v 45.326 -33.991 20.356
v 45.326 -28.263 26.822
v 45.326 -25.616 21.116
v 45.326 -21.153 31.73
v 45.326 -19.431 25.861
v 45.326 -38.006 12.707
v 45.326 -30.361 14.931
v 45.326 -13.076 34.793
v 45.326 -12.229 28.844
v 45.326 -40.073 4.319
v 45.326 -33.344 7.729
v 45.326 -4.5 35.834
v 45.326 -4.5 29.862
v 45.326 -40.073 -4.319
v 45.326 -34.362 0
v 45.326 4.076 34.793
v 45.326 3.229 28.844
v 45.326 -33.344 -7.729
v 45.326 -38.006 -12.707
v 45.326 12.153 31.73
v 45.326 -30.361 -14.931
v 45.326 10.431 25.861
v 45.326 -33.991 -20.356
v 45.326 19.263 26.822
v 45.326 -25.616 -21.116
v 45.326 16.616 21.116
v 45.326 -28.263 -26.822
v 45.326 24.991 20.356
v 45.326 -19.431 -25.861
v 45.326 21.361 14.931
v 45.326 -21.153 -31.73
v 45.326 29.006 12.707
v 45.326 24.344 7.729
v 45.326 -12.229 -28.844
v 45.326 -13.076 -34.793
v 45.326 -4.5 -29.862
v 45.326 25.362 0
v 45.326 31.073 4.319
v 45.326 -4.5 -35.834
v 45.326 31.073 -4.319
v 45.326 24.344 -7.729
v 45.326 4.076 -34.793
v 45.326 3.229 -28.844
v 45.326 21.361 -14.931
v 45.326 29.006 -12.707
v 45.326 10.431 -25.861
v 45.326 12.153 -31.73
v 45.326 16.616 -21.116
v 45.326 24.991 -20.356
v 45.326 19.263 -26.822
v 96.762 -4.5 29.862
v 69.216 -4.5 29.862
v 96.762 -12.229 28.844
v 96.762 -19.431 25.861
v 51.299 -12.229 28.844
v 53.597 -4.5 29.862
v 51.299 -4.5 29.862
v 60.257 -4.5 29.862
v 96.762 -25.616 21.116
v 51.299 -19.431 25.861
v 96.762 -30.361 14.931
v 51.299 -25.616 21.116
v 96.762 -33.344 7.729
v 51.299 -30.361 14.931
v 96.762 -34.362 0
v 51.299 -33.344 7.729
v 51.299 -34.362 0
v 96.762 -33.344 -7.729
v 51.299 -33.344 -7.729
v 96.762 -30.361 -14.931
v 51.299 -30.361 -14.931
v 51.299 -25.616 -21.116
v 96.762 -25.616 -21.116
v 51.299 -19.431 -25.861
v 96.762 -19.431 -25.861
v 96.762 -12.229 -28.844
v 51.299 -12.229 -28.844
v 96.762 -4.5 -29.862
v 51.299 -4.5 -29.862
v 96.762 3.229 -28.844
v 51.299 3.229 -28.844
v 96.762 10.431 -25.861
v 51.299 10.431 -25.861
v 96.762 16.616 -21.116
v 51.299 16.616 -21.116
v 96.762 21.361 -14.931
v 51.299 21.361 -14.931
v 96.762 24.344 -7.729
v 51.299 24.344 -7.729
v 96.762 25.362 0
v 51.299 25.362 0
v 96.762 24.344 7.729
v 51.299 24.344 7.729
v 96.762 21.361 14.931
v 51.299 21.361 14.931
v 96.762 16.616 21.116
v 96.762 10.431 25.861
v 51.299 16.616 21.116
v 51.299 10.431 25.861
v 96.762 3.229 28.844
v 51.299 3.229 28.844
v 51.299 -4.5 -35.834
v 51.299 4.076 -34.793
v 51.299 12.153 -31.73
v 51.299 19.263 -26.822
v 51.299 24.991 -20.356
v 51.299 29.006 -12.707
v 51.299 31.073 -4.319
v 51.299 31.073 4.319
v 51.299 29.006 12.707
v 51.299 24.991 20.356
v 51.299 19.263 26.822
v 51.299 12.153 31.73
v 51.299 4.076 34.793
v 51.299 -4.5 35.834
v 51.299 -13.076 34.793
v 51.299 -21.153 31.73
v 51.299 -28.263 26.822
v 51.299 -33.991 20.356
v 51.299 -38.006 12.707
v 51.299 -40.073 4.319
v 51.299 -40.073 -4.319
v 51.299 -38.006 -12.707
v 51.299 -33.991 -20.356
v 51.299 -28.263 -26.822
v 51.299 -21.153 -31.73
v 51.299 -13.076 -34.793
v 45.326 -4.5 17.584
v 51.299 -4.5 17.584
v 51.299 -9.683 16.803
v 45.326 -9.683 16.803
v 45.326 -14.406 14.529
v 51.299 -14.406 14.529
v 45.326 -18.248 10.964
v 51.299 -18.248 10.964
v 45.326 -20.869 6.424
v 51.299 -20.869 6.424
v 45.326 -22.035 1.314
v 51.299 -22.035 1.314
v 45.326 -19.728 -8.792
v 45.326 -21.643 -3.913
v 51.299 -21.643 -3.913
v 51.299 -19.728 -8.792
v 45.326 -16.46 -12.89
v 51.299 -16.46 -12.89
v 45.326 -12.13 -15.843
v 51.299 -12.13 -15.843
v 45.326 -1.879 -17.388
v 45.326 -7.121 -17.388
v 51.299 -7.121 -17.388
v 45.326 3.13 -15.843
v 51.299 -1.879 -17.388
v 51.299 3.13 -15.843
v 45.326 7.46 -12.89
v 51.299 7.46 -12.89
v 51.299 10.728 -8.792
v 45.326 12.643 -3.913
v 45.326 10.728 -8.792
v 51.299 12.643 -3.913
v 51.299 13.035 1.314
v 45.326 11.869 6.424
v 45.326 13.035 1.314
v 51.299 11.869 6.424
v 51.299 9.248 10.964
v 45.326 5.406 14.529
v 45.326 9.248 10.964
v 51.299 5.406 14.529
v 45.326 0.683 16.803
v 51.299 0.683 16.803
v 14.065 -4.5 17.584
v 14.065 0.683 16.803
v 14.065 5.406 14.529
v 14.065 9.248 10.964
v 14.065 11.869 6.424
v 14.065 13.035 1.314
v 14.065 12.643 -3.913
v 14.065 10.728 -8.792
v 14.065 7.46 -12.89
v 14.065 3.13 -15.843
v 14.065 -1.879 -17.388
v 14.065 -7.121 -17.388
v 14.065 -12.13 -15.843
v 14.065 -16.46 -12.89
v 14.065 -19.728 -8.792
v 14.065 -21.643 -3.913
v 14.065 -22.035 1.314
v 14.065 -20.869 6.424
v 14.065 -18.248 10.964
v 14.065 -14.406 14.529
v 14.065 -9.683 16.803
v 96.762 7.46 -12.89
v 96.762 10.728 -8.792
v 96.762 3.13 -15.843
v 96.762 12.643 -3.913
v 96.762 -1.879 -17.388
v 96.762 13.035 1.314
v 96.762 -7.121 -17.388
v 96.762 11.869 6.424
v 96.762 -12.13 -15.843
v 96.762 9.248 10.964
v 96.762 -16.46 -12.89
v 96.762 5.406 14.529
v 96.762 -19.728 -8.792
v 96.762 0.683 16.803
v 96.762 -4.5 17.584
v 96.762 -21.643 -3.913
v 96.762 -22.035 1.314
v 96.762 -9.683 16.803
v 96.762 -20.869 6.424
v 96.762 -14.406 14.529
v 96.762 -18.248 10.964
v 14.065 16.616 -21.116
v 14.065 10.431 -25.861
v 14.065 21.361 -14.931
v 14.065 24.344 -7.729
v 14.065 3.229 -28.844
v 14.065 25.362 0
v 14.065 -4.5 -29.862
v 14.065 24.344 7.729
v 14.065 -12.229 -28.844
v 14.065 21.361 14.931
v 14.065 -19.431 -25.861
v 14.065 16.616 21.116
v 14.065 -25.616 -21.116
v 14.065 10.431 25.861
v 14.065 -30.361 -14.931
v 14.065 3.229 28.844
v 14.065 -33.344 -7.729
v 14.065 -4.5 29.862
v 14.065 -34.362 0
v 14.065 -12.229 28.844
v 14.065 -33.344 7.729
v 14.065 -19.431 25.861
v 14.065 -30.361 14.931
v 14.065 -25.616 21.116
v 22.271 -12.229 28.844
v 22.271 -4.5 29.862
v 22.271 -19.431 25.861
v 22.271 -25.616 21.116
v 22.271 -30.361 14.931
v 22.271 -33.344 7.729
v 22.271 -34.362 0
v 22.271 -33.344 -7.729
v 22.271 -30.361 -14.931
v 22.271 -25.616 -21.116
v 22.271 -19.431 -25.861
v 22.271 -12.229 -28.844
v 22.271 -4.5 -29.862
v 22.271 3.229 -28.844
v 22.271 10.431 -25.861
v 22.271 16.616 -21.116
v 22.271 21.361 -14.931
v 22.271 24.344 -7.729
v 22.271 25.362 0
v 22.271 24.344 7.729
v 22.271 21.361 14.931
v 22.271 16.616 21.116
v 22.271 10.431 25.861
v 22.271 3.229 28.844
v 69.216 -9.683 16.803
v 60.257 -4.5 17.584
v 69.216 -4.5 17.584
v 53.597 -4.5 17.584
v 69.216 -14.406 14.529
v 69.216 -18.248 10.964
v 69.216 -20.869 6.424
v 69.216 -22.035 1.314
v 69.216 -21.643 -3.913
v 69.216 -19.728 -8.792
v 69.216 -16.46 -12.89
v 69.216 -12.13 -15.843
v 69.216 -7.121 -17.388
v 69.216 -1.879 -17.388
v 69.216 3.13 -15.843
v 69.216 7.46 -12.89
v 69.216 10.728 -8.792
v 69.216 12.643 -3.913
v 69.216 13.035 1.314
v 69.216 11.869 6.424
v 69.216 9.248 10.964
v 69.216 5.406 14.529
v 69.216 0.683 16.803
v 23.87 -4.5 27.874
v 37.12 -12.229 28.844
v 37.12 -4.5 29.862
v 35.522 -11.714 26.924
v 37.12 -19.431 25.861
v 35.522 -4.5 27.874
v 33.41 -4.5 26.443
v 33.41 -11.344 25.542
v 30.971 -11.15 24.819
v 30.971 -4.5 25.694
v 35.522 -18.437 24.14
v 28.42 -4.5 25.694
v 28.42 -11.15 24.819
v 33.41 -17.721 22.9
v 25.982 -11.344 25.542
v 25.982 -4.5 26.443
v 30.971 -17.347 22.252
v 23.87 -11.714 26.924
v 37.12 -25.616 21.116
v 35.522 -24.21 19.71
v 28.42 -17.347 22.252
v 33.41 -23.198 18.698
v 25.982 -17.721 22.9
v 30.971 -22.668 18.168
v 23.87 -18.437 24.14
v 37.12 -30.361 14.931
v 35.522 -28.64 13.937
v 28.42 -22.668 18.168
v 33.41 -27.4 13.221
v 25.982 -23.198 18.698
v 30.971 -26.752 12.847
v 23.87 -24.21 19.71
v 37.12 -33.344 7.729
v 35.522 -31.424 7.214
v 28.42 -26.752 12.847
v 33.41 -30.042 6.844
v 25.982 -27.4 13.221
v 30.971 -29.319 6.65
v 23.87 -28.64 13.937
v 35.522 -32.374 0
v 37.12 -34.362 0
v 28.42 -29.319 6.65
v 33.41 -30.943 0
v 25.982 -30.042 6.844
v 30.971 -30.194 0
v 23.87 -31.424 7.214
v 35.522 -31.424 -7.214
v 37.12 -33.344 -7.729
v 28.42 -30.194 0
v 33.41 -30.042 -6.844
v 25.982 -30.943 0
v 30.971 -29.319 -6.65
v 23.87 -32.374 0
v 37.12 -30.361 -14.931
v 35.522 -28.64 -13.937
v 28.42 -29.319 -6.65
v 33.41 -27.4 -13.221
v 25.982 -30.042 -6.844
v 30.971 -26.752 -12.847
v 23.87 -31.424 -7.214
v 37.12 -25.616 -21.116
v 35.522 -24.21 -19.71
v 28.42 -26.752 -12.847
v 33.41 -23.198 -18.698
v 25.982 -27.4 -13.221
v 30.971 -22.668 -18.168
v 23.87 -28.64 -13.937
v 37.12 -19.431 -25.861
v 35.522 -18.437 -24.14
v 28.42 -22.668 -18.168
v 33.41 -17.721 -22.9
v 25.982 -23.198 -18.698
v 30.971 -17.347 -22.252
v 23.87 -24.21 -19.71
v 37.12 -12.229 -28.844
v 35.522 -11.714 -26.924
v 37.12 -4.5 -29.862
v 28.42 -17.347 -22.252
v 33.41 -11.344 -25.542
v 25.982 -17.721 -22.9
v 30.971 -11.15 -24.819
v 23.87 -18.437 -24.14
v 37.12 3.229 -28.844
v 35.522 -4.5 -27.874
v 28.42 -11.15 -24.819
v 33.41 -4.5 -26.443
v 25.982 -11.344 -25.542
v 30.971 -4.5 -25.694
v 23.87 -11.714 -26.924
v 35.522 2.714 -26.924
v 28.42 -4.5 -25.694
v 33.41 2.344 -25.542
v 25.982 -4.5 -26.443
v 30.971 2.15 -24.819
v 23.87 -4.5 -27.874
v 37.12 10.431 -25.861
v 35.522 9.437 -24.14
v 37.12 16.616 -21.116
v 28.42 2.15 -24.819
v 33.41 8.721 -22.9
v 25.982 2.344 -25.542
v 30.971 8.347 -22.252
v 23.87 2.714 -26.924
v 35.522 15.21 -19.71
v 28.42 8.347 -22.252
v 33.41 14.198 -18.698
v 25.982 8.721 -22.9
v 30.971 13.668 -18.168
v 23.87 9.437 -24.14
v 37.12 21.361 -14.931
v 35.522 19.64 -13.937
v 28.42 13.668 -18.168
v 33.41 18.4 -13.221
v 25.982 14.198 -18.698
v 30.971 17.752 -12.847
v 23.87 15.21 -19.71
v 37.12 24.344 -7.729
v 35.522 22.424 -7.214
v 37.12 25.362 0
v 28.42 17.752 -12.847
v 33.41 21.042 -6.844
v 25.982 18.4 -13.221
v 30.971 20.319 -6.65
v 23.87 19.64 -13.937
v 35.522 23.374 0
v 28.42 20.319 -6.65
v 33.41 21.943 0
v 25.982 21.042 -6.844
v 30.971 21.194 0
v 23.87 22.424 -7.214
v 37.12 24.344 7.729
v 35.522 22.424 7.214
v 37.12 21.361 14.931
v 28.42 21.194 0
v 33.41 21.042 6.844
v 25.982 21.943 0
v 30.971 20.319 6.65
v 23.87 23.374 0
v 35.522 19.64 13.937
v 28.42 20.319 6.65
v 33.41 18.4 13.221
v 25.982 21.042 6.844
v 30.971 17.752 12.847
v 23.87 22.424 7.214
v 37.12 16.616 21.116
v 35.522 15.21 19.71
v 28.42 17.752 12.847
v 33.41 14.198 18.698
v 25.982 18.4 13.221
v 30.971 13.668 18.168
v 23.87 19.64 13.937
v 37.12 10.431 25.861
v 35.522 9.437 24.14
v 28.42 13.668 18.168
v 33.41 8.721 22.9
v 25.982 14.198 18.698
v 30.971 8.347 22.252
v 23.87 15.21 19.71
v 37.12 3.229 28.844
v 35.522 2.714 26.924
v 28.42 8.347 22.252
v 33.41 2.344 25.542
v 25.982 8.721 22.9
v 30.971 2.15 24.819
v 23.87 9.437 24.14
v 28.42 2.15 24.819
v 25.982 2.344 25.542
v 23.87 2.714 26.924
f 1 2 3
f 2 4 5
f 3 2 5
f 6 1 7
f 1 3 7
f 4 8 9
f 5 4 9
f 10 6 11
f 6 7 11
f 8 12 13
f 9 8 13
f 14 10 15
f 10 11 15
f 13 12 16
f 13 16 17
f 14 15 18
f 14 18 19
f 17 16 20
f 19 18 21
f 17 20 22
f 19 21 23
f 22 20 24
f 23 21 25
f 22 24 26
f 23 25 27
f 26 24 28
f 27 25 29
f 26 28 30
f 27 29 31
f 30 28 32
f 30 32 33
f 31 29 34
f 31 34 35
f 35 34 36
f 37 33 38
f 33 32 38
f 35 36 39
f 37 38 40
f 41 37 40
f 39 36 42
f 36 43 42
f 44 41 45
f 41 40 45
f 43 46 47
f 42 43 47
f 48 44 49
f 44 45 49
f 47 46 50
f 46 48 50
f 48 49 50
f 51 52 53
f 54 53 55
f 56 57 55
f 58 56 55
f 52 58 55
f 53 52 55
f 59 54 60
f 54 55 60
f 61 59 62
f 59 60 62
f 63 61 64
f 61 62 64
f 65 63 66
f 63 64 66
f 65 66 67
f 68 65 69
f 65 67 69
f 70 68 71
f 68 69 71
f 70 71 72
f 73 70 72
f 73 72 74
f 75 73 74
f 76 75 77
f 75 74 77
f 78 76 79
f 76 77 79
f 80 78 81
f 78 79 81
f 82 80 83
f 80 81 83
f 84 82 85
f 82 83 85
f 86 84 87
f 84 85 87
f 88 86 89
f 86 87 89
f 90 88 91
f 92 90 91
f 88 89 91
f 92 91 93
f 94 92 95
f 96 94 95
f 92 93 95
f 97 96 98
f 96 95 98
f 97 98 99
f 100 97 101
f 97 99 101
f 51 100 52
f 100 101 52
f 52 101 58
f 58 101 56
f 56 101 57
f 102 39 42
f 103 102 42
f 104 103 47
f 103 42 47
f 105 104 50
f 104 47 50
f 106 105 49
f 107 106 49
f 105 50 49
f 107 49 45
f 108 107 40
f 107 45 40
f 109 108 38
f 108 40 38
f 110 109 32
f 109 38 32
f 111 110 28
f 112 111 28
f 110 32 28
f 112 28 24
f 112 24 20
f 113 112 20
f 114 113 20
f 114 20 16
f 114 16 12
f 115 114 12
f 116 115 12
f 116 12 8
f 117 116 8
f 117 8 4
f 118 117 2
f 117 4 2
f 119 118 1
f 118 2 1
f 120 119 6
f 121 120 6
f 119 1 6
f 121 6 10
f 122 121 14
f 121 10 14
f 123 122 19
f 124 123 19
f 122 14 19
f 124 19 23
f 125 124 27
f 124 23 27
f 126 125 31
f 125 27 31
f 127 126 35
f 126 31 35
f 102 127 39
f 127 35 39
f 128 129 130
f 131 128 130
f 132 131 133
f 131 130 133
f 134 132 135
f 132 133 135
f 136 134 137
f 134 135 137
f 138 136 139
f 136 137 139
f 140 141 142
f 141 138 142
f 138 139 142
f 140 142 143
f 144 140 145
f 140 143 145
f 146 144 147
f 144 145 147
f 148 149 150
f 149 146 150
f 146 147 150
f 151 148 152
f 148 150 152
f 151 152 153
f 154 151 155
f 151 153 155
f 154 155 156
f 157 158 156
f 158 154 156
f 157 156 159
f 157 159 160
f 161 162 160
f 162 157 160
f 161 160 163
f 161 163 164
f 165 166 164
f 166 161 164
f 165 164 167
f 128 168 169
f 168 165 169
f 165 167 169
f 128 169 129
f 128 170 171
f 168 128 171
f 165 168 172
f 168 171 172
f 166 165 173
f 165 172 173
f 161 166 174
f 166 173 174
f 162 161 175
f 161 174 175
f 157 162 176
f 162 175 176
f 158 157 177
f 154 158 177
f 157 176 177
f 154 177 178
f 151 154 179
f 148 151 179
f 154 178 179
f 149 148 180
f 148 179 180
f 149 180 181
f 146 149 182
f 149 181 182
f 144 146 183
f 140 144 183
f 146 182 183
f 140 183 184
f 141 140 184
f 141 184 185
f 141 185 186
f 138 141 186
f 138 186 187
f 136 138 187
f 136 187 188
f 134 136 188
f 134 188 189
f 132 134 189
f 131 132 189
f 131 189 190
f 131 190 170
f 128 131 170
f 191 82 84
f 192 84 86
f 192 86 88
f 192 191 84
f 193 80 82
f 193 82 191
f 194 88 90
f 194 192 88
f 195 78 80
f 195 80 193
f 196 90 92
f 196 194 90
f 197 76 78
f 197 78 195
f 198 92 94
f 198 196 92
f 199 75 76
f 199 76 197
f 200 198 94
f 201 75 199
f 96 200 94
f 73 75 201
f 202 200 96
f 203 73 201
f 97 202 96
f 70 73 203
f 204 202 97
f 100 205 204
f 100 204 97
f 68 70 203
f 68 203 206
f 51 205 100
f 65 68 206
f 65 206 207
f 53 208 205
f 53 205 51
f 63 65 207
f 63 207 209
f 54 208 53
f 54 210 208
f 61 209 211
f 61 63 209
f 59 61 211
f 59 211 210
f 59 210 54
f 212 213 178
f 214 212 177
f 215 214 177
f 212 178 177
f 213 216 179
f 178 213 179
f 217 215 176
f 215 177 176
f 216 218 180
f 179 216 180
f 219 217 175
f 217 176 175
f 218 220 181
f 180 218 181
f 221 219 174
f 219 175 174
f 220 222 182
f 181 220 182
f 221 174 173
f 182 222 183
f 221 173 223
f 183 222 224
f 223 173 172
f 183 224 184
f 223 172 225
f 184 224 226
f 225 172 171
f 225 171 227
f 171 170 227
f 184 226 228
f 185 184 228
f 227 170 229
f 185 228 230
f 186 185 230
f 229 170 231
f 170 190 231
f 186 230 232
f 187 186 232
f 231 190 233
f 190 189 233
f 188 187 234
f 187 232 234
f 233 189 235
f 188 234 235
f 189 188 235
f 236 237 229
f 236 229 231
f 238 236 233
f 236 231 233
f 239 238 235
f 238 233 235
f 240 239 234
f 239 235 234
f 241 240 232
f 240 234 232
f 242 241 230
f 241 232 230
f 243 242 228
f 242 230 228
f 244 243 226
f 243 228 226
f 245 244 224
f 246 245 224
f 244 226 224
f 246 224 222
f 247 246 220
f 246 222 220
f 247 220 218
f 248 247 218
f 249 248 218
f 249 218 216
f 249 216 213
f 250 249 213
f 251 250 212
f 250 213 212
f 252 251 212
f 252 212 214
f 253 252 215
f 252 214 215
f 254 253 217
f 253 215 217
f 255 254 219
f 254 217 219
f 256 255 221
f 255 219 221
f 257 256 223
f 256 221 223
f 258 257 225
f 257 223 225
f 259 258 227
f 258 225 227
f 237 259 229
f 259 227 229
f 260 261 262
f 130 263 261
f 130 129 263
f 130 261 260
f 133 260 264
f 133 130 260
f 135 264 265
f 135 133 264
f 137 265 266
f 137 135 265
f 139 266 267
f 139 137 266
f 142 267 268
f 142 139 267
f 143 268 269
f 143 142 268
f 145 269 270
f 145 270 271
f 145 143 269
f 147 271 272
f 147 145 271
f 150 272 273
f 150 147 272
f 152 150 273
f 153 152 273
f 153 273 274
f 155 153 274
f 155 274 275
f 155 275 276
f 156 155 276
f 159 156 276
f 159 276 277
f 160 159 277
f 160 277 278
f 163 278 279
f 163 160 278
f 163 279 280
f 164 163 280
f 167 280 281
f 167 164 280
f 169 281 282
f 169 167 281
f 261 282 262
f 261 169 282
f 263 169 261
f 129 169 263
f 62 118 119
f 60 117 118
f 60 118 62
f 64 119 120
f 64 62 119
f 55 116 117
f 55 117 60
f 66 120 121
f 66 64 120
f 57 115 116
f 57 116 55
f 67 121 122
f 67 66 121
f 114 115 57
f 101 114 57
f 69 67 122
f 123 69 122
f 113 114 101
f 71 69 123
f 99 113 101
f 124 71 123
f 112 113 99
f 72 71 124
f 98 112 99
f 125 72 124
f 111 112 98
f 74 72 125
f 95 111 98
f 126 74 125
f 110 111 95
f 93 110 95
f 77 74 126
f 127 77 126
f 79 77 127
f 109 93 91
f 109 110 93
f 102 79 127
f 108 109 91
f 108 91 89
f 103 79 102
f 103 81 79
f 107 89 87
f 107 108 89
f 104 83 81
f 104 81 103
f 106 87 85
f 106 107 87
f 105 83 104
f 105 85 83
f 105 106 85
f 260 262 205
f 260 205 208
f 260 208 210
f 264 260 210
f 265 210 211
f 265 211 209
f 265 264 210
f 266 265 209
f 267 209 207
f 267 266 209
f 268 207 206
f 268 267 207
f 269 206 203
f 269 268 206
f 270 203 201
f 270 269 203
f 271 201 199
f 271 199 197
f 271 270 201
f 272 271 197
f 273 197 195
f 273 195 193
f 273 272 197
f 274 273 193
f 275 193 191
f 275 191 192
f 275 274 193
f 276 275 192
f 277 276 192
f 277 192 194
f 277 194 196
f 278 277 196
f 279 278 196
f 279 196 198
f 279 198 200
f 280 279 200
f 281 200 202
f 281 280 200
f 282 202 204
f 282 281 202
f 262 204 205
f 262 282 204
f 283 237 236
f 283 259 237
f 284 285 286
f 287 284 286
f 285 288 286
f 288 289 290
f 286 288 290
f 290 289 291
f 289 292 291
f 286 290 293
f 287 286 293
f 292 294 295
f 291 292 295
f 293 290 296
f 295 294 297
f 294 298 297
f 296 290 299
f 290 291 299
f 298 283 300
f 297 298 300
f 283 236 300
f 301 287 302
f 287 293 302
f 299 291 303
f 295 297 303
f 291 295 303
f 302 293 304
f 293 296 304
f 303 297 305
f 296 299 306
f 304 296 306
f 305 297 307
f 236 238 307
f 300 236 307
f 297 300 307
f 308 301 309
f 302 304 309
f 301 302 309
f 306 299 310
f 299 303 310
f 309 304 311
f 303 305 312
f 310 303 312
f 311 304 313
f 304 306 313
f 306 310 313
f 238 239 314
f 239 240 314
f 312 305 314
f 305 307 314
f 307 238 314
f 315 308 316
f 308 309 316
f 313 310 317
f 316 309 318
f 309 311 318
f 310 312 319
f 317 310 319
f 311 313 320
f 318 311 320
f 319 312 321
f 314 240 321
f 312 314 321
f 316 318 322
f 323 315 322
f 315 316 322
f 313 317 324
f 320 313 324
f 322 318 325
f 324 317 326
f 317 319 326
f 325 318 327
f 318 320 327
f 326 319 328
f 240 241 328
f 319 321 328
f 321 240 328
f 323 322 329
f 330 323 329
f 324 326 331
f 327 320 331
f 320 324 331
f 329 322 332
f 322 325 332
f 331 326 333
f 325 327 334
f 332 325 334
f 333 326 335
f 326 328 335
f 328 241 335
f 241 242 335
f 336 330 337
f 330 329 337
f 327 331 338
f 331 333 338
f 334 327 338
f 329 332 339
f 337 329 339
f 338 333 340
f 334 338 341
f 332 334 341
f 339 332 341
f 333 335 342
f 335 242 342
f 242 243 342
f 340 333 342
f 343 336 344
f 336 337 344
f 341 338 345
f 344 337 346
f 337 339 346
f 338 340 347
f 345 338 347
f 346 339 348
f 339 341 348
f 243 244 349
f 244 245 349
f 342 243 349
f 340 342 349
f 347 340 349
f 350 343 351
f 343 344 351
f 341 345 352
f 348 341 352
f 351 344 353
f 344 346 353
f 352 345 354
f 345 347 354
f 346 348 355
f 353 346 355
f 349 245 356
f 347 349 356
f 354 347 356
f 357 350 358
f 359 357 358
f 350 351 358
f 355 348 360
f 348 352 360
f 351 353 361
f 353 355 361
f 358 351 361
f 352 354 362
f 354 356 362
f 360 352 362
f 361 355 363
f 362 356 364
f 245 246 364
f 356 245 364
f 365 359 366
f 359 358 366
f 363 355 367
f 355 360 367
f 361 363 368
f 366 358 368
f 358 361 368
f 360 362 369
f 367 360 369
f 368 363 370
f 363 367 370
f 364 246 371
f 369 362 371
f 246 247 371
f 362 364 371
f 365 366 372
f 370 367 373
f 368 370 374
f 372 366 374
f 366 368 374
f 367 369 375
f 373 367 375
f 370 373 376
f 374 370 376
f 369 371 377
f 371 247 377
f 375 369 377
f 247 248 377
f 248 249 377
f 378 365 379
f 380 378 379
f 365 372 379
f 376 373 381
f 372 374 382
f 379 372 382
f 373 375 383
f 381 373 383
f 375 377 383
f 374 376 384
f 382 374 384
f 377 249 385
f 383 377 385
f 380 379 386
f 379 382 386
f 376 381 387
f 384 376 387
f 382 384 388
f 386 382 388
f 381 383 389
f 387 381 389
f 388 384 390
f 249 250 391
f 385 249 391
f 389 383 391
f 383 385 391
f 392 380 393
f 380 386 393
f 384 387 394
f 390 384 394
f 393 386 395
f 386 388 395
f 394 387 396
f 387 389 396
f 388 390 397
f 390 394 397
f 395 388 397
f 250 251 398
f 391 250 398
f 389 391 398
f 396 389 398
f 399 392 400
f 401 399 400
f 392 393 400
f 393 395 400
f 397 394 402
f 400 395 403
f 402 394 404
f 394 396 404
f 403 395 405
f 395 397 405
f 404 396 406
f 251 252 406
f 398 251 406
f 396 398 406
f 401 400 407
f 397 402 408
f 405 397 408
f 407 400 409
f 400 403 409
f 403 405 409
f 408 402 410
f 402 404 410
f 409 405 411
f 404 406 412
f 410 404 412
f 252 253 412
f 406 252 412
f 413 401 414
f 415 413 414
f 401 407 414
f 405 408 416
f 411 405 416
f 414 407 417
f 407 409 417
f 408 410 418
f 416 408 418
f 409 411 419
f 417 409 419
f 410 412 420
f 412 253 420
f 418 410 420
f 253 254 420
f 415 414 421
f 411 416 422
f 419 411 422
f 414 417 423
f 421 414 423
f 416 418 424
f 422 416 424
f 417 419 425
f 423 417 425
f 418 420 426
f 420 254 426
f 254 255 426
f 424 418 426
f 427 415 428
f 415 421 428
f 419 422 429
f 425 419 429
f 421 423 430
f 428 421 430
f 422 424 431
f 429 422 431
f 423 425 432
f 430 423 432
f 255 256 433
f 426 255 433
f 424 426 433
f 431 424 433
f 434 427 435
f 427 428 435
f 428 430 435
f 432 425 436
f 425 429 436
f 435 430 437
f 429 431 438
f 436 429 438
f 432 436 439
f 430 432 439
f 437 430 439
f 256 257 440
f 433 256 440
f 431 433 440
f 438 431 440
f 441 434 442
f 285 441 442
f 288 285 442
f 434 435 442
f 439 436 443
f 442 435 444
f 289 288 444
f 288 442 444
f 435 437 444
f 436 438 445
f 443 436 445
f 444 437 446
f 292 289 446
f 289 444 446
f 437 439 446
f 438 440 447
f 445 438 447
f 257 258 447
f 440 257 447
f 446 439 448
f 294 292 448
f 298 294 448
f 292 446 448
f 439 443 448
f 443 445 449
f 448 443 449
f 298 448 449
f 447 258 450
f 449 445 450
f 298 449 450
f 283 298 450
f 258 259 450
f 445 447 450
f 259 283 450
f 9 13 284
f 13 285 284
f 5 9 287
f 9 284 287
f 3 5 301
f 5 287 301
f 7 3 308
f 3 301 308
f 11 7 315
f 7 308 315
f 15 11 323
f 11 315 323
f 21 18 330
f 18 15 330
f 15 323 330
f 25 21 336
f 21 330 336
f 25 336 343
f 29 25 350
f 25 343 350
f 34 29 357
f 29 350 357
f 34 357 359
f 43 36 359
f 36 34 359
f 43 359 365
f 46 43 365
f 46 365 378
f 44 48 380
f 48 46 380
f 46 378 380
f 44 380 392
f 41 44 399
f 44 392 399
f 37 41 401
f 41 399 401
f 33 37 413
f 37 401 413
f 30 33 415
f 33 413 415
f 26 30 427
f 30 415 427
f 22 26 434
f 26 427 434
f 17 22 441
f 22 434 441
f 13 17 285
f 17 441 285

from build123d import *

# Parameters (mm, degrees)
SCALE1_SCALE        = 6
SKETCH4_R           = 45.852
BOSS_EXTRUDE1_DEPTH = 12.7
SKETCH5_R           = 27
CUT_EXTRUDE1_DEPTH  = 84.317043923
SCALE2_SCALE        = 3.323882225
SKETCH7_R           = 152.406647765
SKETCH7_R_2         = 89.744820066
BOSS_EXTRUDE2_DEPTH = 33.99
SCALE3_SCALE        = 0.416652997
BOSS_EXTRUDE3_START = -31.75
SKETCH8_R           = 76.200686546
BOSS_EXTRUDE3_DEPTH = 12.7
SKETCH9_R           = 63.500686546
SKETCH9_R_2         = 37.392448241
BOSS_EXTRUDE4_DEPTH = 19.05
SKETCH10_R          = 37.392448241
CUT_EXTRUDE2_DEPTH  = 137.337641642
SCALE4_SCALE        = 0.70539227
SKETCH11_R          = 44.792893449
SKETCH11_R_2        = 26.376343957
BOSS_EXTRUDE5_DEPTH = 41.32
SCALE5_SCALE        = 0.666666667


with BuildPart() as part:
    # Sketch1 → Revolve1 (revolve)
    with BuildSketch(Plane.XY, mode=Mode.PRIVATE) as revolve1_sk:
        with BuildLine():
            Line((0, 0), (4, 0))
            Line((4, 0), (4, 3.142))
            Line((4, 3.142), (1.9, 3.142))
            ThreePointArc((1.9, 3.142), (0, 2.051053651), (-1.9, 3.142))
            Line((-1.9, 3.142), (-4, 3.142))
            Line((-4, 3.142), (-4, 0))
            Line((-4, 0), (0, 0))
        make_face()
    revolve(revolve1_sk.sketch.rotate(Axis((-4, -4.5, 0), (1, 0, 0)), 90), axis=Axis((-4, -4.5, 0), (1, 0, 0)))


with BuildPart() as part_1:
    # Scale1: scaled about (0, -4.5, 0)
    add(part.part.scale(SCALE1_SCALE).moved(Location((0, 22.5, 0))))

    # Sketch4 → Boss-Extrude1 (add)
    with BuildSketch(Plane(origin=(24, 0, 0), x_dir=(0, 0, -1), z_dir=(1, 0, 0))):
        with Locations(Location((0, -4.5, 0), (0, 0, 180))):
            Circle(SKETCH4_R)
    extrude(amount=BOSS_EXTRUDE1_DEPTH)

    # Sketch5 → Cut-Extrude1 (cut, through all)
    with BuildSketch(Plane.ZY.offset(-24)):
        with Locations((0, -4.5)):
            Circle(SKETCH5_R)
    extrude(amount=-CUT_EXTRUDE1_DEPTH, mode=Mode.SUBTRACT)


with BuildPart() as part_2:
    # Scale2: scaled about (7.131190873, -4.5, 0)
    add(part_1.part.scale(SCALE2_SCALE).moved(Location((-16.57204771, 10.457470011, 0))))

    # Sketch7 → Boss-Extrude2 (add)
    with BuildSketch(Plane(origin=(105.414429934, 0, 0), x_dir=(0, 0, -1), z_dir=(1, 0, 0))):
        with Locations(Location((0, -4.5, 0), (0, 0, 180))):
            Circle(SKETCH7_R)
        with Locations(Location((0, -4.5, 0), (0, 0, 180))):
            Circle(SKETCH7_R_2, mode=Mode.SUBTRACT)
    extrude(amount=BOSS_EXTRUDE2_DEPTH)


with BuildPart() as part_3:
    # Scale3: scaled about (25.471225568, -4.5, 0)
    add(part_2.part.scale(SCALE3_SCALE).moved(Location((14.858563099, -2.625061514, 0))))

    # Sketch8 → Boss-Extrude3 (add)
    with BuildSketch(Plane(origin=(72.941836619, 0, 0), x_dir=(0, 0, -1), z_dir=(1, 0, 0)).offset(BOSS_EXTRUDE3_START)):
        with Locations((0, -4.5)):
            Circle(SKETCH8_R)
    extrude(amount=BOSS_EXTRUDE3_DEPTH)

    # Sketch9 → Boss-Extrude4 (add)
    with BuildSketch(Plane(origin=(72.941836619, 0, 0), x_dir=(0, 0, -1), z_dir=(1, 0, 0))):
        with Locations(Location((0, -4.5, 0), (0, 0, 180))):
            Circle(SKETCH9_R)
        with Locations(Location((0, -4.5, 0), (0, 0, 180))):
            Circle(SKETCH9_R_2, mode=Mode.SUBTRACT)
    extrude(amount=BOSS_EXTRUDE4_DEPTH)

    # Sketch10 → Cut-Extrude2 (cut, through all)
    with BuildSketch(Plane(origin=(53.891836619, 0, 0), x_dir=(0, 0, -1), z_dir=(1, 0, 0))):
        with Locations(Location((0, -4.5, 0), (0, 0, 180))):
            Circle(SKETCH10_R)
    extrude(amount=-CUT_EXTRUDE2_DEPTH, mode=Mode.SUBTRACT)


with BuildPart() as part_4:
    # Scale4: scaled about (36.400291081, -4.5, 0)
    add(part_3.part.scale(SCALE4_SCALE).moved(Location((10.723807116, -1.325734784, 0))))

    # Sketch11 → Boss-Extrude5 (add)
    with BuildSketch(Plane(origin=(75.614137598, 0, 0), x_dir=(0, 0, -1), z_dir=(1, 0, 0))):
        with Locations(Location((0, -4.5, 0), (0, 0, 180))):
            Circle(SKETCH11_R)
        with Locations(Location((0, -4.5, 0), (0, 0, 180))):
            Circle(SKETCH11_R_2, mode=Mode.SUBTRACT)
    extrude(amount=BOSS_EXTRUDE5_DEPTH)


with BuildPart() as part_5:
    # Scale5: scaled about (56.419036868, -4.5, 0)
    add(part_4.part.scale(SCALE5_SCALE).moved(Location((18.806345623, -1.5, 0))))


solid = part_5.part
